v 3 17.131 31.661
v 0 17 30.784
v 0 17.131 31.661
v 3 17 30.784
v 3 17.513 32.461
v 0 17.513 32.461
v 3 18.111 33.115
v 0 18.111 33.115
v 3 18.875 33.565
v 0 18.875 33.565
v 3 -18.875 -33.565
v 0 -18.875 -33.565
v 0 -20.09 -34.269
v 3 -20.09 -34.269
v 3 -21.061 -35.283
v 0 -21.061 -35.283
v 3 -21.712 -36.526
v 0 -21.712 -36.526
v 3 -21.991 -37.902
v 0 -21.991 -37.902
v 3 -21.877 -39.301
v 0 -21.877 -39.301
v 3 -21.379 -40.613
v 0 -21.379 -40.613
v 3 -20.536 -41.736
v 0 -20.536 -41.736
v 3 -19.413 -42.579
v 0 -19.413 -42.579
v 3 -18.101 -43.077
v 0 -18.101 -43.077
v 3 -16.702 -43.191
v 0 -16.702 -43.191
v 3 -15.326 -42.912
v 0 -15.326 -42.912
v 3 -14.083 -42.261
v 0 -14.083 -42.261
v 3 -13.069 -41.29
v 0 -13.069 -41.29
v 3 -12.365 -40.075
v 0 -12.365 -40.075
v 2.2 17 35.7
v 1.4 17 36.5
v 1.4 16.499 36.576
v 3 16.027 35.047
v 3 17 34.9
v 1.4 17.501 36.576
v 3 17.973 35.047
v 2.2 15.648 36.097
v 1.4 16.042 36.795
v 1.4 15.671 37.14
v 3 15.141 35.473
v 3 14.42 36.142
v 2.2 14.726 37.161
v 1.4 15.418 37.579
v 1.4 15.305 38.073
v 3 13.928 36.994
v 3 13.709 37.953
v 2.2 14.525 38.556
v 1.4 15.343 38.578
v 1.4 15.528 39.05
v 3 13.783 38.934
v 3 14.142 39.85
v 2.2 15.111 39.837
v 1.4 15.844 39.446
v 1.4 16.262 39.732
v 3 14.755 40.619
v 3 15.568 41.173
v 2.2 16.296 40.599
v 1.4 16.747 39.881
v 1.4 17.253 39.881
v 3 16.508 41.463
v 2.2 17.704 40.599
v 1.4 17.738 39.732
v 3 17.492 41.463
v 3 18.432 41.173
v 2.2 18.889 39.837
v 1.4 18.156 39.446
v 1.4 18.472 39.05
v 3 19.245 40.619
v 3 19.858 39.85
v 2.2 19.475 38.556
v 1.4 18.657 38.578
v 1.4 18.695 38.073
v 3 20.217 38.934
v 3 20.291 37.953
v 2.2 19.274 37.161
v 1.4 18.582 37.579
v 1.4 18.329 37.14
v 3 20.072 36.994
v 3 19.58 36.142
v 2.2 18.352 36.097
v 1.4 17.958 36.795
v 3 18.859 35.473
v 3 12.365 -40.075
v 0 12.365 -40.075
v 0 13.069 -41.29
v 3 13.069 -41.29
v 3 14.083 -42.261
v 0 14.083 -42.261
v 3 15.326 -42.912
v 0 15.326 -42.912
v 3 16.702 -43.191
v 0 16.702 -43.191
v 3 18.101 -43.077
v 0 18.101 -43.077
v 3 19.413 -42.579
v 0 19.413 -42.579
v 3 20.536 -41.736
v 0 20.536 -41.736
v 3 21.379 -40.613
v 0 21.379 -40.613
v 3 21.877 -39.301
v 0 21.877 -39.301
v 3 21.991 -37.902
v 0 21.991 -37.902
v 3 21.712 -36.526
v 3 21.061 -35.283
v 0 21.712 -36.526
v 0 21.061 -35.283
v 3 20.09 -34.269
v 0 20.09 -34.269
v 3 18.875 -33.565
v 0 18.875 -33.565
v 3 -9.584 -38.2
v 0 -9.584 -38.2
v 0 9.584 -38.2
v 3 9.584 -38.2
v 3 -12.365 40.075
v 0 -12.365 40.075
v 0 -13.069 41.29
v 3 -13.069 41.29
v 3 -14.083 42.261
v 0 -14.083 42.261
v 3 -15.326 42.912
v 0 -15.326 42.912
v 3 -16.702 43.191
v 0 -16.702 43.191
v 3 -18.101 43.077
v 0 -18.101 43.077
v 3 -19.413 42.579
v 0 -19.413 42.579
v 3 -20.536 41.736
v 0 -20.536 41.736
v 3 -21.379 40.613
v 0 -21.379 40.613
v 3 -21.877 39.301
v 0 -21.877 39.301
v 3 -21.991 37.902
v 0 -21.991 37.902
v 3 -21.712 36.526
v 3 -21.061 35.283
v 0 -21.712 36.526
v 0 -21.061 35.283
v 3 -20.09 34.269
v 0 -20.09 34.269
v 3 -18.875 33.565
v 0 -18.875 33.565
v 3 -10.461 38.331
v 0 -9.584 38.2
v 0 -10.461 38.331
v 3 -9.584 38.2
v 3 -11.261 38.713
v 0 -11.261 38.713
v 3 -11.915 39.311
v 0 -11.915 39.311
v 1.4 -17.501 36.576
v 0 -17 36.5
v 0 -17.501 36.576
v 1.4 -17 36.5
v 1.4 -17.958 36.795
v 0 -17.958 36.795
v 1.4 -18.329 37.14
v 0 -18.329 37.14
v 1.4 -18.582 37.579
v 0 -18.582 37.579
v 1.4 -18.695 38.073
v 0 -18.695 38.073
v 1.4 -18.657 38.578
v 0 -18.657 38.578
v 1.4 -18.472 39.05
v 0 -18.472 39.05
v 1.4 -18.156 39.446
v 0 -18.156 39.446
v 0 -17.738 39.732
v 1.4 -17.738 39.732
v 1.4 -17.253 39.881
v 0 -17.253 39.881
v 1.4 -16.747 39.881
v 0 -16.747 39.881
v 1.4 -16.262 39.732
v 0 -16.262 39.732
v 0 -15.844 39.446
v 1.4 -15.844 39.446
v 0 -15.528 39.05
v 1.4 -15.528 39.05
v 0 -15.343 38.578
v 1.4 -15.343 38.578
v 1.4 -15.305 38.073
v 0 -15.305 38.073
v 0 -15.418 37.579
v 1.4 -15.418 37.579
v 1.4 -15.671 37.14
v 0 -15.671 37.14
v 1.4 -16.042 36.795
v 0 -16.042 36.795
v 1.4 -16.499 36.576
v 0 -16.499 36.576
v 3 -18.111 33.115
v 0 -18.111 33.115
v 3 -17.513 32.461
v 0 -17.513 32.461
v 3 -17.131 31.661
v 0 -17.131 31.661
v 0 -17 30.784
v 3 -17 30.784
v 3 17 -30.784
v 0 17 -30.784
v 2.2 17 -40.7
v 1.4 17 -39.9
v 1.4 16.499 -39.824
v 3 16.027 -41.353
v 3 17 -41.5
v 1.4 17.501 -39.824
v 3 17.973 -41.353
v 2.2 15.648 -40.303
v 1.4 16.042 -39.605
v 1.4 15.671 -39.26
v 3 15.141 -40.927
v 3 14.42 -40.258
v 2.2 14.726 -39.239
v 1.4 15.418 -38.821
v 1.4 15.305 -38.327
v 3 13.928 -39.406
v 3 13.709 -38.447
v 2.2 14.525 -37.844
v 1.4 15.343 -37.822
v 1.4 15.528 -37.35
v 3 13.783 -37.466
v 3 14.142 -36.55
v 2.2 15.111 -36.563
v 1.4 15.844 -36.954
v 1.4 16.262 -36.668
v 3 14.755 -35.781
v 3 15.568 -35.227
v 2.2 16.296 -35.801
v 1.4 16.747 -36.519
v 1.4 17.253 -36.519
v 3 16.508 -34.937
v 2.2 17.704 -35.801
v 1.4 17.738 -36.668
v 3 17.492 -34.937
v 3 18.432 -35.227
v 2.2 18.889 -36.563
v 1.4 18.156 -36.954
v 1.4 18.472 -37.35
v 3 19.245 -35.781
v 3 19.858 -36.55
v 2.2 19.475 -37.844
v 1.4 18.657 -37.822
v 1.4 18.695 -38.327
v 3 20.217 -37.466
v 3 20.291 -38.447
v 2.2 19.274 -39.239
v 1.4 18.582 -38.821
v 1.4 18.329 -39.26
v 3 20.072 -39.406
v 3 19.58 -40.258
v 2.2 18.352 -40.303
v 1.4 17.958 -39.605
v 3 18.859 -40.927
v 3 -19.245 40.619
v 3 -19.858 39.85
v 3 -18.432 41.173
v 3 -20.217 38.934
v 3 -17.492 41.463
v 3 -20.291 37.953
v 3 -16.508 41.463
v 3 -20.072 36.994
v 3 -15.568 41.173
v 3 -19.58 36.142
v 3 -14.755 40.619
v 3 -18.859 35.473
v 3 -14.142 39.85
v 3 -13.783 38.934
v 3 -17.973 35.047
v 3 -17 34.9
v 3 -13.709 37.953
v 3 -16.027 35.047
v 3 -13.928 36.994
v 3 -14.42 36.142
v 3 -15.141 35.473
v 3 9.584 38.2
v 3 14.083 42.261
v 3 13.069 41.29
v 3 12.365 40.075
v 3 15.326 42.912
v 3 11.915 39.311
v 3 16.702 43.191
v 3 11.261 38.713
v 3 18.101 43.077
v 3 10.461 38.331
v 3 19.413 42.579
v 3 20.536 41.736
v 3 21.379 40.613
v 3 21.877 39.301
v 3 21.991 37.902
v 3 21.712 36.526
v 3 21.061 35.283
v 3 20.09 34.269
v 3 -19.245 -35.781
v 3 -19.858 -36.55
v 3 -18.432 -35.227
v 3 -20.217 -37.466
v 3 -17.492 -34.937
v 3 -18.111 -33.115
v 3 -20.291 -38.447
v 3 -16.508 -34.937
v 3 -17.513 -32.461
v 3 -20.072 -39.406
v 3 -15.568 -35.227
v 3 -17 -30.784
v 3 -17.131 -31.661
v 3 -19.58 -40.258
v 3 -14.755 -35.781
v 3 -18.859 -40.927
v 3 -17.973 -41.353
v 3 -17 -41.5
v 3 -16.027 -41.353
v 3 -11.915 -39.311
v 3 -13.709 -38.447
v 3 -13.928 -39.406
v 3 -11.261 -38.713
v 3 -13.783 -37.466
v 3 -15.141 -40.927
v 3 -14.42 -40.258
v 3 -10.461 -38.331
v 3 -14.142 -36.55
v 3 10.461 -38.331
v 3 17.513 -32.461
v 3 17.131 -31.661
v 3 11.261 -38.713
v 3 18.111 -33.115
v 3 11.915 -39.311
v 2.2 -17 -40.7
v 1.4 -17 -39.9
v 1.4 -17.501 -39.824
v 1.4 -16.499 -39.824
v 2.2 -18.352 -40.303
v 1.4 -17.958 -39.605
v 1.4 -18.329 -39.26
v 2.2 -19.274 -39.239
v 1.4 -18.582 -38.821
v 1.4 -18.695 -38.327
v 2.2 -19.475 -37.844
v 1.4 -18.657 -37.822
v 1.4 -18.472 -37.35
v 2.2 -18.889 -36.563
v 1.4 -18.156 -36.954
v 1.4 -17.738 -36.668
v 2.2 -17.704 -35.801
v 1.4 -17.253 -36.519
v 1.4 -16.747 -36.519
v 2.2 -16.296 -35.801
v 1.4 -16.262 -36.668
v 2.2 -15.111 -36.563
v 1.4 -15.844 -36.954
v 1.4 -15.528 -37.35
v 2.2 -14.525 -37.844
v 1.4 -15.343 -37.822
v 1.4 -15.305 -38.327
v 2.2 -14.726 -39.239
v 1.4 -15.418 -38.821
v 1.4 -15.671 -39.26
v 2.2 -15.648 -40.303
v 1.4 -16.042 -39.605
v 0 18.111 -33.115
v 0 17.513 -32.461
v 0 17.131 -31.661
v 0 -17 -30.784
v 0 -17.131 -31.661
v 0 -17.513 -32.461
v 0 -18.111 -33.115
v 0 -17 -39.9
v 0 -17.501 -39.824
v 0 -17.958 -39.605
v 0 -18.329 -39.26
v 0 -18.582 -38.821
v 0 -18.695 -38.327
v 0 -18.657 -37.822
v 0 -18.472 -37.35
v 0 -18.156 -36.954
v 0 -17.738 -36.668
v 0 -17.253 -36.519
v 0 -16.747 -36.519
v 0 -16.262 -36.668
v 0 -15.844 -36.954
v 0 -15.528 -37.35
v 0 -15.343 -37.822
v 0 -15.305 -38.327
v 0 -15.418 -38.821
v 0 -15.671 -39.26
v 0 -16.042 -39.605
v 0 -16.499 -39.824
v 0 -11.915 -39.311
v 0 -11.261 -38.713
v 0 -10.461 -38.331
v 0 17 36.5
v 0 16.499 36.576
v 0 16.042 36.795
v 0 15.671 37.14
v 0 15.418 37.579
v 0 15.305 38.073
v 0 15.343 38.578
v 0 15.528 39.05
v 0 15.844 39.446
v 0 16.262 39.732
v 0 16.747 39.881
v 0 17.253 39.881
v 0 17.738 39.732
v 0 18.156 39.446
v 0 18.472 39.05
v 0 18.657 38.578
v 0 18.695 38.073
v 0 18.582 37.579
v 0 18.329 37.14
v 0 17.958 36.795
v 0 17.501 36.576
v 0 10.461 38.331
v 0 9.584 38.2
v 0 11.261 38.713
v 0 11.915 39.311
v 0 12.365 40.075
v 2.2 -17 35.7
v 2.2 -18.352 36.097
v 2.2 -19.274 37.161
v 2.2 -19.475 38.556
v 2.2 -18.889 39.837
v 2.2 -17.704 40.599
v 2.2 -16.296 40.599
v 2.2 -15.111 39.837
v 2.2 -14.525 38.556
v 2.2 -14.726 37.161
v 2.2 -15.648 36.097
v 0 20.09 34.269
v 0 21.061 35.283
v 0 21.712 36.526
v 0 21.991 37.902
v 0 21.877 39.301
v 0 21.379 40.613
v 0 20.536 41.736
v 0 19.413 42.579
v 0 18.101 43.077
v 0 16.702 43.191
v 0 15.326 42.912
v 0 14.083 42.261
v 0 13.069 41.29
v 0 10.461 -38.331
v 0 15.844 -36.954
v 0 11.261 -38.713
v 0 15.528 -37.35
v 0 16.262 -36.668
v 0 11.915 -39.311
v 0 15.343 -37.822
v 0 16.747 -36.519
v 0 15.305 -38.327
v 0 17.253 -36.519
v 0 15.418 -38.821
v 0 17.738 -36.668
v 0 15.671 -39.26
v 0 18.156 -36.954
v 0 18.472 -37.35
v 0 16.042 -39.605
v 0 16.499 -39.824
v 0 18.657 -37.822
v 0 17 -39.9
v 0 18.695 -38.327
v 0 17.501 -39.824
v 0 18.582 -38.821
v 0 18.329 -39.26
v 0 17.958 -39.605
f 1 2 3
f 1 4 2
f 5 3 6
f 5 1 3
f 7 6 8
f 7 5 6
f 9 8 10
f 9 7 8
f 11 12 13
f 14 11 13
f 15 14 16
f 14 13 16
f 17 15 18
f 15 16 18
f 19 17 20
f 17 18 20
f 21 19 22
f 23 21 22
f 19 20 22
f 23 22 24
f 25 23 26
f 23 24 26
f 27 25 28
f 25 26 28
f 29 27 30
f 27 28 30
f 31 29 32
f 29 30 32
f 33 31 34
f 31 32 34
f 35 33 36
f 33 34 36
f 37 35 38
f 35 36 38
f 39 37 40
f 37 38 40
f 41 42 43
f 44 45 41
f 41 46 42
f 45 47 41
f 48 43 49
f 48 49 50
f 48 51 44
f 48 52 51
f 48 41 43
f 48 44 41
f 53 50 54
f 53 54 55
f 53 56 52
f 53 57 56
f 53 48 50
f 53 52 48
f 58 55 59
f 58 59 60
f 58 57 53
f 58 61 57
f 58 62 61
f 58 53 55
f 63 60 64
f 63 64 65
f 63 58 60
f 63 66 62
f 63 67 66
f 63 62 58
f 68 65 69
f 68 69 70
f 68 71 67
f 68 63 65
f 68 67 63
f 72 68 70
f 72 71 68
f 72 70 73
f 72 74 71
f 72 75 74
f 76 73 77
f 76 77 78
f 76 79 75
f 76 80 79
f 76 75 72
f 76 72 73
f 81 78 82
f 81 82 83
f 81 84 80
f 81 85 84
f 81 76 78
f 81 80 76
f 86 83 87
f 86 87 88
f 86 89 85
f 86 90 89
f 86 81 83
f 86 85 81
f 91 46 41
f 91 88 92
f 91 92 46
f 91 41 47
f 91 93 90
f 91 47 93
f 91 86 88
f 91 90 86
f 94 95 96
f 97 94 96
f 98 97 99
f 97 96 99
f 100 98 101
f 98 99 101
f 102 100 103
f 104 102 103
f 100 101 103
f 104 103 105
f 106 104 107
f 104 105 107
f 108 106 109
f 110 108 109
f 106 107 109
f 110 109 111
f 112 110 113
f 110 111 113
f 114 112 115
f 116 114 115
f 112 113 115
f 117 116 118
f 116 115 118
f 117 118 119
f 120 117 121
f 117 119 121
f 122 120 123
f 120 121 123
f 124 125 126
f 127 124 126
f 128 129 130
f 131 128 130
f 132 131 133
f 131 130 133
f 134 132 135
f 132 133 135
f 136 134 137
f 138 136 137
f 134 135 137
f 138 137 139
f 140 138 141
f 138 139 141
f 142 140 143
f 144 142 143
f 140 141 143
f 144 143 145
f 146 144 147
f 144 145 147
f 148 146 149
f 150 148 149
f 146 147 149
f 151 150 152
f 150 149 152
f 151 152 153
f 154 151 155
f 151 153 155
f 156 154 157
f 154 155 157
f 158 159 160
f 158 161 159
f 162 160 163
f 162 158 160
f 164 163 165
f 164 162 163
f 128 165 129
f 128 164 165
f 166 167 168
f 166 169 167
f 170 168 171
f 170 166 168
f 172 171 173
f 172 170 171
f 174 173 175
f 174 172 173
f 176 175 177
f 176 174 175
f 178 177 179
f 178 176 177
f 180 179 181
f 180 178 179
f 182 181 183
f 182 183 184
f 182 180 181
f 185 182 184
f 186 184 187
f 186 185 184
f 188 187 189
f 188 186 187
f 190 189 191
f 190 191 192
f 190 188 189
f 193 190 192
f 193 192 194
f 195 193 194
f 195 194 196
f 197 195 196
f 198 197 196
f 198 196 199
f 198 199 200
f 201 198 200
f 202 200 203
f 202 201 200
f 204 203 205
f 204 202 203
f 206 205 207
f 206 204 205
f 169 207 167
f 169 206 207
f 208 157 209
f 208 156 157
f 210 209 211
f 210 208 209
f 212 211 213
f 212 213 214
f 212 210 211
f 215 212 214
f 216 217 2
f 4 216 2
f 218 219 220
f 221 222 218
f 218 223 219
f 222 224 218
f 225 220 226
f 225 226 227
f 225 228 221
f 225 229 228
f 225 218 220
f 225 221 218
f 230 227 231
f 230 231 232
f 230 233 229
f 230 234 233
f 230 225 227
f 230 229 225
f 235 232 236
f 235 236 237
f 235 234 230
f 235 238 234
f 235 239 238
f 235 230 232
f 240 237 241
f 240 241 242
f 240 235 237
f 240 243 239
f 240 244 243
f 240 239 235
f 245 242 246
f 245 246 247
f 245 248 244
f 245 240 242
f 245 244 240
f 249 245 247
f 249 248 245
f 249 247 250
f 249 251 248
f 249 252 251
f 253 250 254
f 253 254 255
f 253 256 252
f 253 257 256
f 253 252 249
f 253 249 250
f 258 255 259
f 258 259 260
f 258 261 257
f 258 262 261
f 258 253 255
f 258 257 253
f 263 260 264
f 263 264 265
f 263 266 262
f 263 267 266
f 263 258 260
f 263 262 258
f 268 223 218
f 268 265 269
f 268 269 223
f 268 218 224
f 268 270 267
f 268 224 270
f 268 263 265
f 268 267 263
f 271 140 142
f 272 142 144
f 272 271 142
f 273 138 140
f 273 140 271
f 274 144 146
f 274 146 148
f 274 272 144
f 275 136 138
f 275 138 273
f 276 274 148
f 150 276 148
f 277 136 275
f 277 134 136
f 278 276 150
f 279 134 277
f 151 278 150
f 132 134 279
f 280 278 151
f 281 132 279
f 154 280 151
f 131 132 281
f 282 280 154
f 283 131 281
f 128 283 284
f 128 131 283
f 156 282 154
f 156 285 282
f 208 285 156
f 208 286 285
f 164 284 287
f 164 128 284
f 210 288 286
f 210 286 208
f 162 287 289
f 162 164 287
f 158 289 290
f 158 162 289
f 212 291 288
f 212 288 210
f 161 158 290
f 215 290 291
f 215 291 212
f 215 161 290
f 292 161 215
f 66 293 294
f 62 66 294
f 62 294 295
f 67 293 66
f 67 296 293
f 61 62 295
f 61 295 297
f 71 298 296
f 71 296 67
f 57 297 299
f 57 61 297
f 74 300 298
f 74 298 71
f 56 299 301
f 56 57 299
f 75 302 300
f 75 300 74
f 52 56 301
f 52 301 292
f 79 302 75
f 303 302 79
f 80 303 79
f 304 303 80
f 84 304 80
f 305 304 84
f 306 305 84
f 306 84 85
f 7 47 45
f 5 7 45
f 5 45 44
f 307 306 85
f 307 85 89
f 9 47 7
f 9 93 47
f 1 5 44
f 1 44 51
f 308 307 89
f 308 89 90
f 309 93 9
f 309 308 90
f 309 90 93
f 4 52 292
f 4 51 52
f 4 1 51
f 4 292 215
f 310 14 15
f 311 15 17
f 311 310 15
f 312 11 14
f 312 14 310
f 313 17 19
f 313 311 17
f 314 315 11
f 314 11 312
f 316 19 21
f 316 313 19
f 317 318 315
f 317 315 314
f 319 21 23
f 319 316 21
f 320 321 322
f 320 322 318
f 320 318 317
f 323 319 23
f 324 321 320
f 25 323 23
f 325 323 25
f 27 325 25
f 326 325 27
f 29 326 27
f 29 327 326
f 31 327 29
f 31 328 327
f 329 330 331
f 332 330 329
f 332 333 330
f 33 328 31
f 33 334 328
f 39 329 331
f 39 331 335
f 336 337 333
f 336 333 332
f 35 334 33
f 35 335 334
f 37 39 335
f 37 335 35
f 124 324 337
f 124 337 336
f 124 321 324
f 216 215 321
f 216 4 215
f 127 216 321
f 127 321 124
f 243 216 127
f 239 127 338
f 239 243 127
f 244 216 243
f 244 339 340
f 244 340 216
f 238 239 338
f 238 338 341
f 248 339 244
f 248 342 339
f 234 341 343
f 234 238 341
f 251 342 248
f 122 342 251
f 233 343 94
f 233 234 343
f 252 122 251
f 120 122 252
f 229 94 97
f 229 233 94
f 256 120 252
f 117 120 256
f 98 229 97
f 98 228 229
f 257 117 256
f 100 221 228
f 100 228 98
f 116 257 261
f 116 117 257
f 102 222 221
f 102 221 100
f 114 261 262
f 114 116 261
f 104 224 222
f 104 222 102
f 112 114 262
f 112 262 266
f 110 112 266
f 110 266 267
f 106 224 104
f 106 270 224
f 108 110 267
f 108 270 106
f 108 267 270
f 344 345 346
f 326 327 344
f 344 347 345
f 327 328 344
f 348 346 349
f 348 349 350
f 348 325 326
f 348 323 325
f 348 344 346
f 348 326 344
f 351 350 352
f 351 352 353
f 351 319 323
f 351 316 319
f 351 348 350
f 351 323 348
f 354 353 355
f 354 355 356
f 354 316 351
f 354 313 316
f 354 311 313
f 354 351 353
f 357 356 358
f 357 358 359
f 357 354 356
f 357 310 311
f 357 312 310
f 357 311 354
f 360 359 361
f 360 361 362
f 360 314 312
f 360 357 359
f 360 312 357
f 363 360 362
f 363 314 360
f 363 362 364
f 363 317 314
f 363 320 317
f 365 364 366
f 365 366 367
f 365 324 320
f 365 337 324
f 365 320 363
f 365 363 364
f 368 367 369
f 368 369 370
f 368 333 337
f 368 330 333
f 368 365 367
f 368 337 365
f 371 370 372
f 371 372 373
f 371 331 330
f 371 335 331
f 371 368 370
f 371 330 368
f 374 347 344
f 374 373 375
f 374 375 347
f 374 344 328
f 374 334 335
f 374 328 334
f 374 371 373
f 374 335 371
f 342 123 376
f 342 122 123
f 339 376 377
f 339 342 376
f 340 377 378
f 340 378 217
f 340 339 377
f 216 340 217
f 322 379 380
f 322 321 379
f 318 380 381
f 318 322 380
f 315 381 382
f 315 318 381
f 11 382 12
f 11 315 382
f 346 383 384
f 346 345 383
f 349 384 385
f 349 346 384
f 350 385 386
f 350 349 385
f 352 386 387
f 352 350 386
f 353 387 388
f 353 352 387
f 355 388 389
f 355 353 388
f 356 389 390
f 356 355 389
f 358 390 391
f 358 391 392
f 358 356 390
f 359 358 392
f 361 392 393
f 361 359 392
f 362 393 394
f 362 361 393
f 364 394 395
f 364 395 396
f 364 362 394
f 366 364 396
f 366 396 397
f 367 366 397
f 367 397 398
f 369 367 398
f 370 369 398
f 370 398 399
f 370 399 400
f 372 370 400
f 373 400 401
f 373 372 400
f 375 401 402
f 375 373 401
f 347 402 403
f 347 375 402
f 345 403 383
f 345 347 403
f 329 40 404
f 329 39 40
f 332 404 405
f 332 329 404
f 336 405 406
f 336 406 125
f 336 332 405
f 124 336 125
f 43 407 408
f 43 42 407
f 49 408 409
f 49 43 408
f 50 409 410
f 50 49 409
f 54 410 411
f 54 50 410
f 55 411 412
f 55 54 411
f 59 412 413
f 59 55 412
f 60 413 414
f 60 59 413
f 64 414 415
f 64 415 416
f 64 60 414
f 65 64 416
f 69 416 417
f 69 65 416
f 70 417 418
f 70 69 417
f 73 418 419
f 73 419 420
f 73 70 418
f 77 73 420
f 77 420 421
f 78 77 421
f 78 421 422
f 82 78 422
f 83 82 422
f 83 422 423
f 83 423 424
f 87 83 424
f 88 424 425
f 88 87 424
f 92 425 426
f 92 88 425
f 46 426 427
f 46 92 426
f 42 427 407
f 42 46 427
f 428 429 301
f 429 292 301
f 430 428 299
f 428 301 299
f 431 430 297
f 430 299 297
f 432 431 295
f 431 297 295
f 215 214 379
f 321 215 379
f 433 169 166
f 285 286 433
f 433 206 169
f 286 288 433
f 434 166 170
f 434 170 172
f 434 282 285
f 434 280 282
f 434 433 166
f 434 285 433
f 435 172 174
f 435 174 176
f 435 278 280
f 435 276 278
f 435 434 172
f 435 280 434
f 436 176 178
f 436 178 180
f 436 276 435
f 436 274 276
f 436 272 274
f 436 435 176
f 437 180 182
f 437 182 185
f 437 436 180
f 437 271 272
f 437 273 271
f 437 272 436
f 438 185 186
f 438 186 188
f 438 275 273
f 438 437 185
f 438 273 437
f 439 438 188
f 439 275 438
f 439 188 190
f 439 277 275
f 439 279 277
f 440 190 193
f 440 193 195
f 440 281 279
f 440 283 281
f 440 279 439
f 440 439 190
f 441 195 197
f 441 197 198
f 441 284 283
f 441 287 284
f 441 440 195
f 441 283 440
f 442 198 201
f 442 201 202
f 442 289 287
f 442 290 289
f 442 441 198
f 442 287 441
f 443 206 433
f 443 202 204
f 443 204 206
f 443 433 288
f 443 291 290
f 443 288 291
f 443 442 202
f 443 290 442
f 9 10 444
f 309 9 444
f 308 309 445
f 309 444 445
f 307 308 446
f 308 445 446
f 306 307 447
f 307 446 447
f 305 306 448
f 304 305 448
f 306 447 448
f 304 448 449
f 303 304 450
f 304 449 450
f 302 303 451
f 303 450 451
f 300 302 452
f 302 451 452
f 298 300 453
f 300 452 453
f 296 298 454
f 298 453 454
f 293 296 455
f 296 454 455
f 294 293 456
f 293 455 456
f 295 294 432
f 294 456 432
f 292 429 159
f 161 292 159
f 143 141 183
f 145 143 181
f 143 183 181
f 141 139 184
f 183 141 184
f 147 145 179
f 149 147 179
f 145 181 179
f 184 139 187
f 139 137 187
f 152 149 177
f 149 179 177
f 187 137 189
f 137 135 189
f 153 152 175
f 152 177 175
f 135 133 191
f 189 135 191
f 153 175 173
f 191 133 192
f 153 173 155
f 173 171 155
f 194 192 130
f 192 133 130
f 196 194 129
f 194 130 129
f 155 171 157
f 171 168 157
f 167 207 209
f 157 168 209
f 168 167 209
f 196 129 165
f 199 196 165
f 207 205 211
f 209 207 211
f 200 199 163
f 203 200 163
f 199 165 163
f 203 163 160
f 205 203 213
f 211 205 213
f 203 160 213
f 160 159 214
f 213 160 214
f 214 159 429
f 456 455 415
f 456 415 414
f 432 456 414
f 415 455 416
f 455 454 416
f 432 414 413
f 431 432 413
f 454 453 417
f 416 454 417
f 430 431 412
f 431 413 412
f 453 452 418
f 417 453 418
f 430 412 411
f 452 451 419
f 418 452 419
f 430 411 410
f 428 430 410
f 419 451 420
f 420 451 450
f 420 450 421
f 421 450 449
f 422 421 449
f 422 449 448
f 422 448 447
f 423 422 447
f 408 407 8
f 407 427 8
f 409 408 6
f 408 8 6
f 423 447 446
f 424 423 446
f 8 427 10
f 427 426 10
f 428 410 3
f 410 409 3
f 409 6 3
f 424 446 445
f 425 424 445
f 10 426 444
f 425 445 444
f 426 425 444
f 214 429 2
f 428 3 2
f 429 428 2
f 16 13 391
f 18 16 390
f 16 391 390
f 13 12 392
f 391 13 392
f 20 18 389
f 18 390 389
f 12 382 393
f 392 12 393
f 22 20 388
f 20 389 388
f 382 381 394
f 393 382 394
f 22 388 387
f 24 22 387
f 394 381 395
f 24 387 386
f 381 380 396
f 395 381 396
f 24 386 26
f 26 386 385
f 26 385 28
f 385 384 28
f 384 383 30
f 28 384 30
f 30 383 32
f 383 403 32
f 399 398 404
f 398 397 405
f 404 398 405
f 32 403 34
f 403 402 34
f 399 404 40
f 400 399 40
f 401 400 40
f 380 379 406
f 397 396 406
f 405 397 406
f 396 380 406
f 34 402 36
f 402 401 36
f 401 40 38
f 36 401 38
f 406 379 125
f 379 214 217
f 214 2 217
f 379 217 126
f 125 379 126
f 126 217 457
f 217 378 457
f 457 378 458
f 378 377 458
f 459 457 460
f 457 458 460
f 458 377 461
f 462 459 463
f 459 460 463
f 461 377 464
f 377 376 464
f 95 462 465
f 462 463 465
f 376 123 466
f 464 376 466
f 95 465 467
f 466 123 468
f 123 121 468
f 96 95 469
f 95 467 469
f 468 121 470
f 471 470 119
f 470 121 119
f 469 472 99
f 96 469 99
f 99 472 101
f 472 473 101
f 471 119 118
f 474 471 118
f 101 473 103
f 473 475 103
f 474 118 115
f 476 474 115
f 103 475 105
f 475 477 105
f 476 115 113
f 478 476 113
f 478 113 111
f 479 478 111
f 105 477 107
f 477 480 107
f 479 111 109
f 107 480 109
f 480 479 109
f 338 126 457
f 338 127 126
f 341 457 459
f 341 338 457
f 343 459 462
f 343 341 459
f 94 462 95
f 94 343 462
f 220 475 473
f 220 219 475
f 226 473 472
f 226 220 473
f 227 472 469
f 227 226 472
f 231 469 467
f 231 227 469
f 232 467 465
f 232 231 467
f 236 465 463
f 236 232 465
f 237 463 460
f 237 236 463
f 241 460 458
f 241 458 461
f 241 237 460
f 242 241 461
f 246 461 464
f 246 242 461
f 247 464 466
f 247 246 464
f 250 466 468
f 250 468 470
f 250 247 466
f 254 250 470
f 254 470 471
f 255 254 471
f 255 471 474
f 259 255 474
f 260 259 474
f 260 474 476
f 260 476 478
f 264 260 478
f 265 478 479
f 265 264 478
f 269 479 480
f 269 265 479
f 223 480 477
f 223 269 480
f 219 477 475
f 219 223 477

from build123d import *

# Parameters (mm, degrees)
EXTRUDE_1_DEPTH          = 3
FILLET_1_R               = 3
HOLE_WIZARD_1_AT_2_COUNT = 2
HOLE_WIZARD_1_AT_2_PITCH = 34
HOLE_WIZARD_1_AT_3_COUNT = 2
HOLE_WIZARD_1_AT_3_PITCH = 83.623920023
HOLE_WIZARD_1_AT_4_COUNT = 2
HOLE_WIZARD_1_AT_4_PITCH = 76.4


with BuildPart() as part:
    # 草图1 → 凸台-拉伸1 (new body)
    with BuildSketch(Plane(origin=(0, 0, 0), x_dir=(0, 0, -1), z_dir=(1, 0, 0))):
        with BuildLine():
            Line((-38.2, 12), (-38.2, -12))
            ThreePointArc((-38.2, -12), (-41.735533906, -20.535533906), (-33.2, -17))
            Line((-33.2, -17), (33.2, -17))
            ThreePointArc((33.2, -17), (41.735533906, -20.535533906), (38.2, -12))
            Line((38.2, -12), (38.2, 12))
            ThreePointArc((38.2, 12), (41.735533906, 20.535533906), (33.2, 17))
            Line((33.2, 17), (-33.2, 17))
            ThreePointArc((-33.2, 17), (-41.735533906, 20.535533906), (-38.2, 12))
        make_face()
    extrude(amount=EXTRUDE_1_DEPTH)

    # 圆角1
    fillet_1_edges = [part.edges().sort_by_distance(p)[0] for p in [
        (1.5, 17, 33.2),
        (1.5, 17, -33.2),
        (1.5, 12, -38.2),
        (1.5, -12, -38.2),
        (1.5, -17, -33.2),
        (1.5, -17, 33.2),
        (1.5, -12, 38.2),
        (1.5, 12, 38.2),
    ]]
    fillet(fillet_1_edges, radius=FILLET_1_R)

    # 草图2 → 打孔尺寸(%根据十字)槽半沉头木螺钉的类型1 (revolve, cut)
    with BuildSketch(Plane(origin=(3, 17, 38.2), x_dir=(0, 0, -1), z_dir=(0, 1, 0))):
        Polygon((0, 0), (0, 3), (1.7, 3), (1.7, 1.6), (3.3, 0), align=None)
    hole_wizard_1 = revolve(axis=Axis((9.35, 17, 38.2), (-1, 0, 0)), mode=Mode.SUBTRACT)

    # 打孔尺寸(%根据十字)槽半沉头木螺钉的类型1 at 2: 打孔尺寸(%根据十字)槽半沉头木螺钉的类型1 ×2
    with Locations(*[(0, -i * HOLE_WIZARD_1_AT_2_PITCH, 0) for i in range(1, HOLE_WIZARD_1_AT_2_COUNT)]):
        add(hole_wizard_1, mode=Mode.SUBTRACT)

    # 打孔尺寸(%根据十字)槽半沉头木螺钉的类型1 at 3: 打孔尺寸(%根据十字)槽半沉头木螺钉的类型1 ×2
    with Locations(*[Vector(0, -0.406582231, -0.913614191) * (i * HOLE_WIZARD_1_AT_3_PITCH) for i in range(1, HOLE_WIZARD_1_AT_3_COUNT)]):
        add(hole_wizard_1, mode=Mode.SUBTRACT)

    # 打孔尺寸(%根据十字)槽半沉头木螺钉的类型1 at 4: 打孔尺寸(%根据十字)槽半沉头木螺钉的类型1 ×2
    with Locations(*[(0, 0, -i * HOLE_WIZARD_1_AT_4_PITCH) for i in range(1, HOLE_WIZARD_1_AT_4_COUNT)]):
        add(hole_wizard_1, mode=Mode.SUBTRACT)


solid = part.part
